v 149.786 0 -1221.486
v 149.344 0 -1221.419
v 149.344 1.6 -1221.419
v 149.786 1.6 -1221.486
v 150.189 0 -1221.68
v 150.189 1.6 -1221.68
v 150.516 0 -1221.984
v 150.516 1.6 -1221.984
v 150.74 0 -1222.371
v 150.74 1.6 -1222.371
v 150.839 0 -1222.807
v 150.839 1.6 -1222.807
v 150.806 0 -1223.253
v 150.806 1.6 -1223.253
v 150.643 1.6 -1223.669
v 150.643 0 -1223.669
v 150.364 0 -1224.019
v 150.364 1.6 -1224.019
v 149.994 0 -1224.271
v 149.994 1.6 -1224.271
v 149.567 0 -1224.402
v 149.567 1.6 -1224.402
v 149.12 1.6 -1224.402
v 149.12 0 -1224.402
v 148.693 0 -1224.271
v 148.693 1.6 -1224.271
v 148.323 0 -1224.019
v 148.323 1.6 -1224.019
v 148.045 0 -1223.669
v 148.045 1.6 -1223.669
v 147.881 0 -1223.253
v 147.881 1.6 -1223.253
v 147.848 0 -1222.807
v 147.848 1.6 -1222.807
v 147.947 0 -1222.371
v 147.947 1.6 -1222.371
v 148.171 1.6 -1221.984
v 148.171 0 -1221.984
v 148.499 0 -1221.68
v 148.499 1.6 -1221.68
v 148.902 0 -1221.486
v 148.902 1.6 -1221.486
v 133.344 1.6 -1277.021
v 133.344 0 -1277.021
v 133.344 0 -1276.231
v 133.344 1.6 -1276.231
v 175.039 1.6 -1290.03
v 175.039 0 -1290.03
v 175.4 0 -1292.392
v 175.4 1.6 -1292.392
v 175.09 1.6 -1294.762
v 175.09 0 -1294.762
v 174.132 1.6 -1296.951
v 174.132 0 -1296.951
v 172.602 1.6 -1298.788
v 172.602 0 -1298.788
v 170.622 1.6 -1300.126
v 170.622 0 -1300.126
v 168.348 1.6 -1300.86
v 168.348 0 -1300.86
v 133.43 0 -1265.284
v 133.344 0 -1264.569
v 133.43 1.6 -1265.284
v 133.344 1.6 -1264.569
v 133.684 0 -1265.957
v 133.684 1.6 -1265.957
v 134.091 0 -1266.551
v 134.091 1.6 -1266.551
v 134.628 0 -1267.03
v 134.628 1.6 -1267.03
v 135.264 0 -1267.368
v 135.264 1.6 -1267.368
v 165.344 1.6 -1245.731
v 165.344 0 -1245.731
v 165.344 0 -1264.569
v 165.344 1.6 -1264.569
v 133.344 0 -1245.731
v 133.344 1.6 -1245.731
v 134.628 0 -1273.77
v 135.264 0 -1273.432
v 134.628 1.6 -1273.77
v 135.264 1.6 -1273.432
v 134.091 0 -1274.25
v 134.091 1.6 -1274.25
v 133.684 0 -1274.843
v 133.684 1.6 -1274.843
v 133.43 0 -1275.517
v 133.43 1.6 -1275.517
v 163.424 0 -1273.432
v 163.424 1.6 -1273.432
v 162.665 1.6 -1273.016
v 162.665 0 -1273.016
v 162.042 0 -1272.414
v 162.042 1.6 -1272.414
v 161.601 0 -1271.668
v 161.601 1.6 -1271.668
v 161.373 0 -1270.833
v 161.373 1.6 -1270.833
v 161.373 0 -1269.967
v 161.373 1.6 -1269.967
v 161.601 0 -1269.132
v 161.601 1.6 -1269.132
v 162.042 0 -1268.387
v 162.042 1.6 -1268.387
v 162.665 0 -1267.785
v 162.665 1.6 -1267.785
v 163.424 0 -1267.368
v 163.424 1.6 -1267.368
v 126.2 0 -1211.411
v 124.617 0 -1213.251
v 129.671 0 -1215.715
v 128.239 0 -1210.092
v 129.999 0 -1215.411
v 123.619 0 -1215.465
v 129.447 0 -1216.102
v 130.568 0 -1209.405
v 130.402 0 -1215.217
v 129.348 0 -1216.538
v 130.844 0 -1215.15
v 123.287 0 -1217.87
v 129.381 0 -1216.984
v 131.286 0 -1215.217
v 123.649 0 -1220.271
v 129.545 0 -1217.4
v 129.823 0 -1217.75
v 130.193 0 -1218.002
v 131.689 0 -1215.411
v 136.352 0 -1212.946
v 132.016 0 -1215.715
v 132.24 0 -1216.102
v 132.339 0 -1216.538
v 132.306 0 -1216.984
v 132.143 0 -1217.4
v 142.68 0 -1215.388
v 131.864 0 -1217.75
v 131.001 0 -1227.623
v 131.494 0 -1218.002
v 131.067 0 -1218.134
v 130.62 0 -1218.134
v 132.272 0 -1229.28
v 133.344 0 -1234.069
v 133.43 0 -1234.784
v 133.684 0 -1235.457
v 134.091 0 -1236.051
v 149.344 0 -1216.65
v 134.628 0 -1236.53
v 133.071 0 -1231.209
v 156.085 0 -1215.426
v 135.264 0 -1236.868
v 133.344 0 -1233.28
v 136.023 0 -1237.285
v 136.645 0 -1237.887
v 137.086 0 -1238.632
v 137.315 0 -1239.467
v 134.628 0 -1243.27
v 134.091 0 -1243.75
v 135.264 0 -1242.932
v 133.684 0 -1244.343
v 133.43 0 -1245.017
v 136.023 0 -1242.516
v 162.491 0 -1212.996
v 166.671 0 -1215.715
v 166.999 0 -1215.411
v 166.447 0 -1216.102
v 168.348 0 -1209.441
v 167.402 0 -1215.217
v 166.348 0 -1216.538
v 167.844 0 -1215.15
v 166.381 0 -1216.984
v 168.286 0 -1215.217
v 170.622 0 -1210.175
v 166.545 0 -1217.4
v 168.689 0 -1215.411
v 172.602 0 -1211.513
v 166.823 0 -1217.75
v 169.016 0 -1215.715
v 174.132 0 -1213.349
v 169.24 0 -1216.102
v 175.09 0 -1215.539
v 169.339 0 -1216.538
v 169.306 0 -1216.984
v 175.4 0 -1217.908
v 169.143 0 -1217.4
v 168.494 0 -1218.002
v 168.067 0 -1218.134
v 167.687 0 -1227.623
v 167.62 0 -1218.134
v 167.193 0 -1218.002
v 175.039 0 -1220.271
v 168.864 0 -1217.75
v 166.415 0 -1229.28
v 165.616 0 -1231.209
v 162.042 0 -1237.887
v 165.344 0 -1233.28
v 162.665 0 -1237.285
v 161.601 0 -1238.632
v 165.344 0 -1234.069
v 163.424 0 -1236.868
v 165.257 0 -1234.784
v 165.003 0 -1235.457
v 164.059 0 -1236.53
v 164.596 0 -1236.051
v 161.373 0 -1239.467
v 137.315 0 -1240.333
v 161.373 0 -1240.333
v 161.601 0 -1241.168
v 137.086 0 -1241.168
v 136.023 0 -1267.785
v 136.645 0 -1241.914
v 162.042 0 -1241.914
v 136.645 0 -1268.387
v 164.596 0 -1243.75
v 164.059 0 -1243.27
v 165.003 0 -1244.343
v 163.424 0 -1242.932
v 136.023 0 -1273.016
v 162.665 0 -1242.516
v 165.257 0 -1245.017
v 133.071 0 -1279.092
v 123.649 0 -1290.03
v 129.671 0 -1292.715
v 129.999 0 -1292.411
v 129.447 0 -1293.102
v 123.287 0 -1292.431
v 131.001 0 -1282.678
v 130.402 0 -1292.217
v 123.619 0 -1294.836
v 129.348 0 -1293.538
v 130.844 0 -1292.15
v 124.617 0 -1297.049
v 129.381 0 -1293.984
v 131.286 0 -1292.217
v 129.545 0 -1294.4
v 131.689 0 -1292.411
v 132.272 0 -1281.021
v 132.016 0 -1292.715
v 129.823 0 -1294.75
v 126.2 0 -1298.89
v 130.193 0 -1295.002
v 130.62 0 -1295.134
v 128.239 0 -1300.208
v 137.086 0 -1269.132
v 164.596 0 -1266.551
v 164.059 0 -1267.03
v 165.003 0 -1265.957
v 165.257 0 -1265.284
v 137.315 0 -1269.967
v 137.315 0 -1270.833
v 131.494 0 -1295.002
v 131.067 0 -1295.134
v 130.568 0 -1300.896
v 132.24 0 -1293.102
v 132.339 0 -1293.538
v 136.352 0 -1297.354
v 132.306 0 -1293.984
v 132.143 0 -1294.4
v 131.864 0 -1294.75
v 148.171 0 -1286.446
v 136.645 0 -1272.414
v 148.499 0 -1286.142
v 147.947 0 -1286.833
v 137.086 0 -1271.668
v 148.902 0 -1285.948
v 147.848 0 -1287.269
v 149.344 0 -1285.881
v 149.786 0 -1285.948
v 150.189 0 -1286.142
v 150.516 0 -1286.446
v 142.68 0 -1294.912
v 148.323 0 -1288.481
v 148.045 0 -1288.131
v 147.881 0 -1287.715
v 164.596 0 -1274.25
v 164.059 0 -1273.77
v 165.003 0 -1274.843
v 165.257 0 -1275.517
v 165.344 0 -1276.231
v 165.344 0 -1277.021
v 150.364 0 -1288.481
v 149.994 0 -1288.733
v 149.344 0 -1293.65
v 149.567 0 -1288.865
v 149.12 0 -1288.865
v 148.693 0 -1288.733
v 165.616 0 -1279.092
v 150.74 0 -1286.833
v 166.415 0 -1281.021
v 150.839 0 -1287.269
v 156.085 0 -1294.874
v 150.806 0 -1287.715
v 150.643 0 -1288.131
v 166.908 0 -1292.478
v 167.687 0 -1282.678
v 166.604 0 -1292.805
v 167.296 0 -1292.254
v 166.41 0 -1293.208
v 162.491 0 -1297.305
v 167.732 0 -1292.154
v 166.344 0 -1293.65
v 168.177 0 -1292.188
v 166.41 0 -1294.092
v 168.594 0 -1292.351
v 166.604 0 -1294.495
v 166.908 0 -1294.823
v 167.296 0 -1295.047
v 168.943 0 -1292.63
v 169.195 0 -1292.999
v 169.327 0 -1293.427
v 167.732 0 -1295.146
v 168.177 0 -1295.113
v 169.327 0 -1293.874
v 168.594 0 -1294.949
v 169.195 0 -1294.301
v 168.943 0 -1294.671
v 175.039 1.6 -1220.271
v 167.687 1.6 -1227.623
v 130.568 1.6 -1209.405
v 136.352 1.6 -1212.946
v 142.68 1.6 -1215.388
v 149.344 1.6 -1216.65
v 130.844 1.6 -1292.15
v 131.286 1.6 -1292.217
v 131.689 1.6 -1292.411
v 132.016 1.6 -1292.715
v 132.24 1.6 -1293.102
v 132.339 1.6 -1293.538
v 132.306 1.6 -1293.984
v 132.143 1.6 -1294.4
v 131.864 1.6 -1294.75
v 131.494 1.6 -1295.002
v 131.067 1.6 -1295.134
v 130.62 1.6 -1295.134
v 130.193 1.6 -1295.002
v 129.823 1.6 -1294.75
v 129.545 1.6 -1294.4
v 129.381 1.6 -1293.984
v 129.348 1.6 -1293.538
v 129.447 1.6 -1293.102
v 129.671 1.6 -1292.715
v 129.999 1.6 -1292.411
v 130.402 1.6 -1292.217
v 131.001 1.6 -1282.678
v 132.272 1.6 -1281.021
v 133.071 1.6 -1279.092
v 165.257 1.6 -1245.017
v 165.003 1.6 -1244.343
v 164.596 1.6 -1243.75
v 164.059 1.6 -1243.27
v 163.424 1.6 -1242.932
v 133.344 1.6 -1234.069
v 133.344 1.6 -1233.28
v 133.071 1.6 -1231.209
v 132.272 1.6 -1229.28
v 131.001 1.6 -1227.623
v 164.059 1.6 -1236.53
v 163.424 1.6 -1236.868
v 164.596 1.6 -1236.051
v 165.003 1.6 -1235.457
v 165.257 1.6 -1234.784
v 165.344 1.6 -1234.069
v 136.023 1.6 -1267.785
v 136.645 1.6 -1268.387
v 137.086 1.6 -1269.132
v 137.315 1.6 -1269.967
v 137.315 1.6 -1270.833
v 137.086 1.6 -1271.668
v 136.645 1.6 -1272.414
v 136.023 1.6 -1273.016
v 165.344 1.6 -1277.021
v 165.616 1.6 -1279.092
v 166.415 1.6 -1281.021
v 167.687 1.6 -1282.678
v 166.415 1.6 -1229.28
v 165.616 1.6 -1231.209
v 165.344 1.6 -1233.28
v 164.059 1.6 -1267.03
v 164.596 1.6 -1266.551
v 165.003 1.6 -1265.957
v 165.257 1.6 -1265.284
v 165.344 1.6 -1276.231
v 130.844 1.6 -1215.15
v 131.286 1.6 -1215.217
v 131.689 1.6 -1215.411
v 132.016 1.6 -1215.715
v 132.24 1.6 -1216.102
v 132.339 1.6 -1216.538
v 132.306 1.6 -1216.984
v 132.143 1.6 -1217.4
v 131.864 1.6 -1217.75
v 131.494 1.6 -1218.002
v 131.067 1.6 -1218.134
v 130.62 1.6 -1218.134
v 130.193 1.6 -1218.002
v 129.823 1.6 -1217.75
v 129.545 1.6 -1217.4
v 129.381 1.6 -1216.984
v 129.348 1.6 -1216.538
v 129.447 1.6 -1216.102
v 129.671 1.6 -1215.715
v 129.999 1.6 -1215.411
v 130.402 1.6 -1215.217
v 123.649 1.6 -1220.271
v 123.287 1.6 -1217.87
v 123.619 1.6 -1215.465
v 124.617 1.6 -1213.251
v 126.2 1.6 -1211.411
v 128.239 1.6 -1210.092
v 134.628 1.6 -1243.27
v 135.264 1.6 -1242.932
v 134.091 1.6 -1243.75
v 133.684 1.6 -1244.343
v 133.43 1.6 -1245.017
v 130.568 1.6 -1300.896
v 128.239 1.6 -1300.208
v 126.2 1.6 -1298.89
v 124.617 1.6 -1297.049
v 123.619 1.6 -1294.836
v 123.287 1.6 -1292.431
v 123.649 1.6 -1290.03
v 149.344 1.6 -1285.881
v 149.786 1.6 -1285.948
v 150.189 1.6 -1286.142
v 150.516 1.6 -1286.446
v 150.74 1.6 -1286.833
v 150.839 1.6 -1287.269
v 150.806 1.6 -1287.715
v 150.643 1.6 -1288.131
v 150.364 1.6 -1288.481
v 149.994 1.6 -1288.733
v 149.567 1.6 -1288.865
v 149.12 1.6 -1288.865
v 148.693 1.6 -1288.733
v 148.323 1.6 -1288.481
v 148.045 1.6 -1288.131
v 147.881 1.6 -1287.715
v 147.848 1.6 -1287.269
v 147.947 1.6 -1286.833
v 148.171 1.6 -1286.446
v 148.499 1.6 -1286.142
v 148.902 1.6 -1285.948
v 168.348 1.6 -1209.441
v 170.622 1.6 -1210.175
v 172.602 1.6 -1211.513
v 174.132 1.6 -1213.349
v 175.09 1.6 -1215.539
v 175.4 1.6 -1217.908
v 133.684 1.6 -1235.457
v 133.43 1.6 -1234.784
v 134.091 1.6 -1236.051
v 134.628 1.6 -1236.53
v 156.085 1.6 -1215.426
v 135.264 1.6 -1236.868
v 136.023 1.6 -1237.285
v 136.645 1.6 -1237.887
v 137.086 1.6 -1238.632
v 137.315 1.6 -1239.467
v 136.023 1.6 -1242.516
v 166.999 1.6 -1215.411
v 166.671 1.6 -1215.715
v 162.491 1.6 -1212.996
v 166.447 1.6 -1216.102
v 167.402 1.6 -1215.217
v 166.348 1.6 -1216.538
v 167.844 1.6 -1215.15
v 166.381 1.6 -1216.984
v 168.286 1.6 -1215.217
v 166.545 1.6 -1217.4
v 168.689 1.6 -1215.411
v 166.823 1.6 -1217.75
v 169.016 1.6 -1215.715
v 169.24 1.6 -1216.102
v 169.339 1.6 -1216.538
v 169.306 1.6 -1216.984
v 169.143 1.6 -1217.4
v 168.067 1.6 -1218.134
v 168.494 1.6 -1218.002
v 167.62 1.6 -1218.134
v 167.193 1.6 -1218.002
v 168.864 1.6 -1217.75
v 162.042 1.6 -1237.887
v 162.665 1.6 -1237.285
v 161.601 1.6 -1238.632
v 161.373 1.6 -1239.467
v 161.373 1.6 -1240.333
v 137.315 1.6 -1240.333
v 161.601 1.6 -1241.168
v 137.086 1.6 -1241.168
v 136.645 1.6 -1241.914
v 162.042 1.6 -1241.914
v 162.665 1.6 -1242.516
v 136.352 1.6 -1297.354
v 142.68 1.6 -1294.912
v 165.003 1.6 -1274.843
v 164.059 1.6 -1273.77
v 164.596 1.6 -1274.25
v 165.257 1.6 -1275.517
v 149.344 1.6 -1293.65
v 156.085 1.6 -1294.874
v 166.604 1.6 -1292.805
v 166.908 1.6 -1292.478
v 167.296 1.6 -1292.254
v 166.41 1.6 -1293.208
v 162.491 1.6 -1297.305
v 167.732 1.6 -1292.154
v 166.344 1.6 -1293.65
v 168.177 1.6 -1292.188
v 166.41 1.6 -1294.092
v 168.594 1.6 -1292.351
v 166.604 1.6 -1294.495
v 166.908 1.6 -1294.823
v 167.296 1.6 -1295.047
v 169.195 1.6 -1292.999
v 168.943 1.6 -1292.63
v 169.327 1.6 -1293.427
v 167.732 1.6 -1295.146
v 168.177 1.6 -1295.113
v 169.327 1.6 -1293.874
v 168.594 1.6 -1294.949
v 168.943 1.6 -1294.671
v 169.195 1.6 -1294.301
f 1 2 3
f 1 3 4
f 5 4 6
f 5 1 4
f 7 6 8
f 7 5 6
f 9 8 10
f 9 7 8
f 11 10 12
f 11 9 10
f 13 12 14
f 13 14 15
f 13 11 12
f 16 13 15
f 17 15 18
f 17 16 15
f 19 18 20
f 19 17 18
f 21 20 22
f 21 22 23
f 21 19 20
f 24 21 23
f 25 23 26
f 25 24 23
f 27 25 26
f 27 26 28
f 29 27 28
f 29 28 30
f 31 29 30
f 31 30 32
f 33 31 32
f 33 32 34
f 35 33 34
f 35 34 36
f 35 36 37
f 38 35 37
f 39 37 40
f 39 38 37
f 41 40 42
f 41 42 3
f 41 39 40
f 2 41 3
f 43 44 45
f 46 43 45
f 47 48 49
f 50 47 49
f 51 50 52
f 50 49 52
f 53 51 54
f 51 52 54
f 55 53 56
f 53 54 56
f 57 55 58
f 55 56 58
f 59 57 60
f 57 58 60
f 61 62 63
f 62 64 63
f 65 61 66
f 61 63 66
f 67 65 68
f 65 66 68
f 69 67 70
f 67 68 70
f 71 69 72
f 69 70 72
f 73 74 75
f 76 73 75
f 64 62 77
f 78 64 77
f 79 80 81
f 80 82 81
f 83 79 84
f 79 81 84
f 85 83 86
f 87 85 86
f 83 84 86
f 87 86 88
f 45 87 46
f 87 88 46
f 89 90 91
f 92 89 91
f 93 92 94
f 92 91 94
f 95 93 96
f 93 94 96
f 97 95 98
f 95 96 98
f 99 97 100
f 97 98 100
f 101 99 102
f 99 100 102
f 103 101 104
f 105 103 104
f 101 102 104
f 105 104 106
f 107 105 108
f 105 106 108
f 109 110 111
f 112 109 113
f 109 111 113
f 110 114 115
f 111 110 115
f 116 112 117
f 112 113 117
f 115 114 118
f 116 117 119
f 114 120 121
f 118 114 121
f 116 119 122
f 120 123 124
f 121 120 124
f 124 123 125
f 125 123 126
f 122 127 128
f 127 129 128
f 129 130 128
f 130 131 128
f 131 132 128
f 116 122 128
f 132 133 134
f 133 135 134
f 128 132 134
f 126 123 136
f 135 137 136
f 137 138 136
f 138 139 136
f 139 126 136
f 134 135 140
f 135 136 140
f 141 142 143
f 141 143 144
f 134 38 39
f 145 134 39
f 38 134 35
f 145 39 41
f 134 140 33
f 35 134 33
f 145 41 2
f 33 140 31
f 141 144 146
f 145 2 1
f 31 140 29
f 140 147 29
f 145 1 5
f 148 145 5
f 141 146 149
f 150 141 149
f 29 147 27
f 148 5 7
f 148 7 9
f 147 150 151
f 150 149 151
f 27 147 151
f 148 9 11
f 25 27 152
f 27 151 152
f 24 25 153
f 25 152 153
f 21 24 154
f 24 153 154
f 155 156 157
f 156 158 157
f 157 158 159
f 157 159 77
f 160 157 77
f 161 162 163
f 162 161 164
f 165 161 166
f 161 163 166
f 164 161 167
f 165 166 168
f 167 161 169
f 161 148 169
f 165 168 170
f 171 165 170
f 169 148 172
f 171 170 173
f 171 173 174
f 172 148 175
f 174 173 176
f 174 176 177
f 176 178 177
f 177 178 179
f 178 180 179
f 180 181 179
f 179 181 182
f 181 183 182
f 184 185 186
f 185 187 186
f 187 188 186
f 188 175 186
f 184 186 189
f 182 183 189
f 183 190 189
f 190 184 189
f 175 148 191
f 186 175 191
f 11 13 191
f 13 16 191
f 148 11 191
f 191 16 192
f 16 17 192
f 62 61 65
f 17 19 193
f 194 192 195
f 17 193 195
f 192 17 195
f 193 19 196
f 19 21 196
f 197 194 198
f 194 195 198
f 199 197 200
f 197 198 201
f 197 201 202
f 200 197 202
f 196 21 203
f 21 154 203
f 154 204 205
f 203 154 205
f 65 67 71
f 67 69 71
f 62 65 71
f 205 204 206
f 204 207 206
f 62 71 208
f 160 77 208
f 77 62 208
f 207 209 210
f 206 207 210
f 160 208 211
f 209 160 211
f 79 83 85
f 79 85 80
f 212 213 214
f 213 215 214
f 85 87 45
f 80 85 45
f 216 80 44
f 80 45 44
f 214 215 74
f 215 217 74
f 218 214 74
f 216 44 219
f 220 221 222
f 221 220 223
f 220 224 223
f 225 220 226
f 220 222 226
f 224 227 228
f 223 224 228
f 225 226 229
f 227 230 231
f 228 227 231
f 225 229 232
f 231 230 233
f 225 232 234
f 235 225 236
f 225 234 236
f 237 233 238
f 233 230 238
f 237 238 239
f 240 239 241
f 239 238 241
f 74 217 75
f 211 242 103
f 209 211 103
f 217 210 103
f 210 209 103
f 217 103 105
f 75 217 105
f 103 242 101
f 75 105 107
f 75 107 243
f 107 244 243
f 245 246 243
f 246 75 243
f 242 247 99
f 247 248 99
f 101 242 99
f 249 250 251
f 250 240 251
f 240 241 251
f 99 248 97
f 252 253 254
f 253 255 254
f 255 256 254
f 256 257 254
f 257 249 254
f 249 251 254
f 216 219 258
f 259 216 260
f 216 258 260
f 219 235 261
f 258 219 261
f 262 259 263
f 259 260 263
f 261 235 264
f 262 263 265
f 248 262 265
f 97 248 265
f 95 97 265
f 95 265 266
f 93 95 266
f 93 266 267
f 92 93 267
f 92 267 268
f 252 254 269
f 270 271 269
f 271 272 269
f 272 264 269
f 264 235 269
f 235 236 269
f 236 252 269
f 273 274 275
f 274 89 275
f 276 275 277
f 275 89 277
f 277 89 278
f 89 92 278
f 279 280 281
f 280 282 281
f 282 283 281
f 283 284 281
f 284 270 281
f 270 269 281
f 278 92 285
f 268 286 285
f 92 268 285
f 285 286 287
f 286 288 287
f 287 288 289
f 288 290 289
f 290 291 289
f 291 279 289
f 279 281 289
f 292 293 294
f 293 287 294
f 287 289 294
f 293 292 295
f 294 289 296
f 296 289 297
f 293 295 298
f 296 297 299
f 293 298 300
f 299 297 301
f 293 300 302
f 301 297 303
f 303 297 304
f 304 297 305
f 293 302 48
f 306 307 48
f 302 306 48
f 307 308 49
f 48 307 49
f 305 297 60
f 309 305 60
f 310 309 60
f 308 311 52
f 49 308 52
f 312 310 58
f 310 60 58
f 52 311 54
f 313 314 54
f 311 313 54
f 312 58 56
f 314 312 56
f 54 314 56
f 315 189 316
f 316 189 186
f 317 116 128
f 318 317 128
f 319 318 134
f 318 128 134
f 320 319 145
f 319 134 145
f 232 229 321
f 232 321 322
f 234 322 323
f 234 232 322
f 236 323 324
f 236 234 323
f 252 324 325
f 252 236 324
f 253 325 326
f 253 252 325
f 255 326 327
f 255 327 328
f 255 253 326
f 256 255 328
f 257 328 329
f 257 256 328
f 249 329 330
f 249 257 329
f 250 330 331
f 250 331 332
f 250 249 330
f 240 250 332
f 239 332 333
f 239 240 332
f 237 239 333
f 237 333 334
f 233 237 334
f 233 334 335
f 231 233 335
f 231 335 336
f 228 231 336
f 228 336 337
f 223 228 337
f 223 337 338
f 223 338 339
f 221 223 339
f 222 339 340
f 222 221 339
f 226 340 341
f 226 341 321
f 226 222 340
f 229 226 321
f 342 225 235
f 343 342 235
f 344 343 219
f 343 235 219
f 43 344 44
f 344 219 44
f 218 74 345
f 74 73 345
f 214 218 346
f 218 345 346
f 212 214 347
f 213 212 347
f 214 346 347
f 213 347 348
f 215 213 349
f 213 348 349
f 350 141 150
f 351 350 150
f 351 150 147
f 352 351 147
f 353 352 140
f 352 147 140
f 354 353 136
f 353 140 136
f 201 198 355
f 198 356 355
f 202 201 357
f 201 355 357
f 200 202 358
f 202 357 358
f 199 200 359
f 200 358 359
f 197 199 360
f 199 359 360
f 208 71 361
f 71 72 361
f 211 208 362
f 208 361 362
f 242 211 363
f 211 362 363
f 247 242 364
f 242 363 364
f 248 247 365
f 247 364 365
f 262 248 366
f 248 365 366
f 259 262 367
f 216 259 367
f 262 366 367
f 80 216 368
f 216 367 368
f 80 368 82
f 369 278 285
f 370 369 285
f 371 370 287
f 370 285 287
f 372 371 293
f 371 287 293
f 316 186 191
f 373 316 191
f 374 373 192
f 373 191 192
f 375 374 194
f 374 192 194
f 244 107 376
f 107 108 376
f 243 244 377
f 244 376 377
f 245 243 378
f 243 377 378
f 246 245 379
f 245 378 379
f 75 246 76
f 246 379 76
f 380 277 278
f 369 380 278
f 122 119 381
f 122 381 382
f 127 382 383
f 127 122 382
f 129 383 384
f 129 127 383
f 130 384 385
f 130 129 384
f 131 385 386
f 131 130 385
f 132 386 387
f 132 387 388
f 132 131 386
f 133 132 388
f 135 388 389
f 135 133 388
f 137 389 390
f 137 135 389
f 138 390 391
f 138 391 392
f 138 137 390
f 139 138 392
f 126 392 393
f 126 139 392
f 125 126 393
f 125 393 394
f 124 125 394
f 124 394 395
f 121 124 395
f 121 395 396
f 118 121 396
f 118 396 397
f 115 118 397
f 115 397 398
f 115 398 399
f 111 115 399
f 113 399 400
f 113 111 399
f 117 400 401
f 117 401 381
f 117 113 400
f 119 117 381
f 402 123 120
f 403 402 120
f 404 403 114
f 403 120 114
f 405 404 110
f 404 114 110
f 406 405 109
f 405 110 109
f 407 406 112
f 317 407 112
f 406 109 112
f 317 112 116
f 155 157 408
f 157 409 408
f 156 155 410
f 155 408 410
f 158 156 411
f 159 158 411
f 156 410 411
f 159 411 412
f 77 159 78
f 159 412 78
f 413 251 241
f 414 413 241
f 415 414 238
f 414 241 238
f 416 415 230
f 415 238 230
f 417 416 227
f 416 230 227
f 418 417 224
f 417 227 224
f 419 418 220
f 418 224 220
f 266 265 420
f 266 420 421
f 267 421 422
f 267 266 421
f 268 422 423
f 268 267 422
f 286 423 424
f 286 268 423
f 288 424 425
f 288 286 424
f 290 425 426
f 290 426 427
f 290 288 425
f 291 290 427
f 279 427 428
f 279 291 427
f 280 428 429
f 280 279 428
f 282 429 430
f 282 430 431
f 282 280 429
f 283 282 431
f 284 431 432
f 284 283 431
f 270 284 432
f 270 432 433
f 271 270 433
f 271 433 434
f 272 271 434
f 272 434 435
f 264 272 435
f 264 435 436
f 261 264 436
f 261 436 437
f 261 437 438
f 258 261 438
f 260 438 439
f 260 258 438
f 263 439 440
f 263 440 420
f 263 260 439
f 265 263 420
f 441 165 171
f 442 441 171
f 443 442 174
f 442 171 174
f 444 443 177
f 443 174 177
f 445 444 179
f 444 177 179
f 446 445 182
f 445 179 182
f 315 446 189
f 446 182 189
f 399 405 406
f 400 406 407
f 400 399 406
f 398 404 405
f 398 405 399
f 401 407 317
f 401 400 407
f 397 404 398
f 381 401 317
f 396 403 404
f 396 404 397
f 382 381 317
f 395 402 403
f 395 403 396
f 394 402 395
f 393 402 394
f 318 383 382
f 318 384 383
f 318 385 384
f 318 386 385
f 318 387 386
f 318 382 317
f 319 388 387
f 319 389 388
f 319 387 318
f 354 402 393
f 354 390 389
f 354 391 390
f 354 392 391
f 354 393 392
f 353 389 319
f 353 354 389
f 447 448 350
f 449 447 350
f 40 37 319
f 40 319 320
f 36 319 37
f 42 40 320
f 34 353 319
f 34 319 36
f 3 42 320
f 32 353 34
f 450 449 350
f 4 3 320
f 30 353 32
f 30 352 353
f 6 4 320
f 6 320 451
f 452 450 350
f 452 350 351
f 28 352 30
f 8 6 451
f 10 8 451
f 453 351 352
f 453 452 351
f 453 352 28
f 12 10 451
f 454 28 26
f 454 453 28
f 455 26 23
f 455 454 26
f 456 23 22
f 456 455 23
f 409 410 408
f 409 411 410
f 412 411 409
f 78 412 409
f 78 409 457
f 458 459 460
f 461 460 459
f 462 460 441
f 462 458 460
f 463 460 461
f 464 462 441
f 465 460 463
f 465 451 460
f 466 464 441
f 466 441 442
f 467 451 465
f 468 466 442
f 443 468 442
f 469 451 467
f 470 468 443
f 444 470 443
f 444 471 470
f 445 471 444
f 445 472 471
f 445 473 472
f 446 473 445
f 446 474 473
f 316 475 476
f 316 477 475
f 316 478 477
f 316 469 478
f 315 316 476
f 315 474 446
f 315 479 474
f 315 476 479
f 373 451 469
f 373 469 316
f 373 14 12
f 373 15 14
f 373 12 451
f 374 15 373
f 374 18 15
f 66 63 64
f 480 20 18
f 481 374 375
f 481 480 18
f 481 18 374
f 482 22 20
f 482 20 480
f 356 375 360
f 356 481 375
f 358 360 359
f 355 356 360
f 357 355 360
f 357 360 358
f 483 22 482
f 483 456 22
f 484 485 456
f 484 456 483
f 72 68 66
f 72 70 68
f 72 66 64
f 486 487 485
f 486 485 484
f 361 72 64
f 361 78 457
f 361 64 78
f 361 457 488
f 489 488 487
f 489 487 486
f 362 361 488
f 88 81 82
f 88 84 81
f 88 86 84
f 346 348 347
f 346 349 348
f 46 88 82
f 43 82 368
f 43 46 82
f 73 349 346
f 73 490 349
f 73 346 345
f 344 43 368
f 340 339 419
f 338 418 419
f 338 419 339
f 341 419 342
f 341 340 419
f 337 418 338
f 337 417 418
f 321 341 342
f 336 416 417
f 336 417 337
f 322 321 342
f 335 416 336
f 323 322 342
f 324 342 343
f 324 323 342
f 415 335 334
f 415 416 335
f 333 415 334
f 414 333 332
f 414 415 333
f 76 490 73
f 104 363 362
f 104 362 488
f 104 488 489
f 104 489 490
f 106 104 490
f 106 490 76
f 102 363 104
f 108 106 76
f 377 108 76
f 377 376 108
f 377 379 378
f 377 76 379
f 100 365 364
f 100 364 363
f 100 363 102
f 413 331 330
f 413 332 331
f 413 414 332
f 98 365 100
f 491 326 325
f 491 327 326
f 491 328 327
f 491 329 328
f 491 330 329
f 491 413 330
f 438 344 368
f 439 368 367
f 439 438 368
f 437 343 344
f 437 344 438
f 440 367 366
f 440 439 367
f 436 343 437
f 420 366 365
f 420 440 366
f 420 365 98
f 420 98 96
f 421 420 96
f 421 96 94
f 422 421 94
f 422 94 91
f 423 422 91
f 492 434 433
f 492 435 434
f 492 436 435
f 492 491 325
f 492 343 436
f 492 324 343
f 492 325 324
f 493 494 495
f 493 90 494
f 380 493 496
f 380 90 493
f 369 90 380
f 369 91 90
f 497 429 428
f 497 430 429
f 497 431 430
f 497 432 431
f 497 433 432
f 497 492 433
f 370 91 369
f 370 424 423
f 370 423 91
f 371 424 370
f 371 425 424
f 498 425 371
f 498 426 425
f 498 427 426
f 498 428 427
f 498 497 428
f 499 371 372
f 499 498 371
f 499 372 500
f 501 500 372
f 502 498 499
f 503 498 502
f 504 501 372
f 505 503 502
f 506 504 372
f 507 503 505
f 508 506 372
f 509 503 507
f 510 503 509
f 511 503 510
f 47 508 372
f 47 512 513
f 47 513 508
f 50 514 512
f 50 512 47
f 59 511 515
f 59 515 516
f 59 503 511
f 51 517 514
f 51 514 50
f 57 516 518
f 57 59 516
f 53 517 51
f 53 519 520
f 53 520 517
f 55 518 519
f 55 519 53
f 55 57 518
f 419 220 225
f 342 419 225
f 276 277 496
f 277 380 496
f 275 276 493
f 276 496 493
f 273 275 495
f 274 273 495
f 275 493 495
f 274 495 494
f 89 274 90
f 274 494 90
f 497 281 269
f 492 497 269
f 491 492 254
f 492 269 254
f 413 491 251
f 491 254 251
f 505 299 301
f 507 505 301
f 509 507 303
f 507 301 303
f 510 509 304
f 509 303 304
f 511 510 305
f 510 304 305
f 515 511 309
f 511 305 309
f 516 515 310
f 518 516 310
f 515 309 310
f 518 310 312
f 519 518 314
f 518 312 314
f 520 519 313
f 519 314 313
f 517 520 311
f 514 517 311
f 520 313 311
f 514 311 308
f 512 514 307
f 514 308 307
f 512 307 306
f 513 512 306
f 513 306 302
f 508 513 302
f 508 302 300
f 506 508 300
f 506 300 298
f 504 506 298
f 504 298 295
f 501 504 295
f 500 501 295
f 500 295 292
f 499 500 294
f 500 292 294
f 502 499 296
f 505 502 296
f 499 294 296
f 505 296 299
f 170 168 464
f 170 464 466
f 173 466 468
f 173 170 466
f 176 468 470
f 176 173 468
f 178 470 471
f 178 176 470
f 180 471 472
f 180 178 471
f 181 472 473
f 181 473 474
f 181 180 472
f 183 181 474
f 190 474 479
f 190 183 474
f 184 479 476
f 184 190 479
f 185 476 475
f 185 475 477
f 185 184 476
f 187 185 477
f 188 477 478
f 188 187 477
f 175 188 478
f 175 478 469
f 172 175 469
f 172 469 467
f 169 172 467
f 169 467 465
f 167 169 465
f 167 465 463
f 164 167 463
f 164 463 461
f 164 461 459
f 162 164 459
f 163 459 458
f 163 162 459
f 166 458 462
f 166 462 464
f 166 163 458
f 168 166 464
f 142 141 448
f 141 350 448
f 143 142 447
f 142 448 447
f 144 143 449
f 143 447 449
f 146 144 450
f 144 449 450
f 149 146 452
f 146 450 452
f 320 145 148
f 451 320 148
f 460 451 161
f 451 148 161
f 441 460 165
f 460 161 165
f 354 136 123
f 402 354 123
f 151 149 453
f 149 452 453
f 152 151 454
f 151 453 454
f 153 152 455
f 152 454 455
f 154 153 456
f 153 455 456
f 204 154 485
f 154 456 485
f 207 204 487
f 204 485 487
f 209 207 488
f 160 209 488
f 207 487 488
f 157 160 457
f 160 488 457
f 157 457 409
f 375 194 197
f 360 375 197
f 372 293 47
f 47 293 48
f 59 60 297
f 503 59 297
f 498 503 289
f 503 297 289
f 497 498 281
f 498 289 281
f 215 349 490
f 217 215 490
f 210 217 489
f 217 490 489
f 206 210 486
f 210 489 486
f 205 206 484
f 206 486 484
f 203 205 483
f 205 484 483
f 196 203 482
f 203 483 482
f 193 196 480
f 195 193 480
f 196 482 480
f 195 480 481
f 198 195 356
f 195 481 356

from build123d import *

# Parameters (mm, degrees)
SKETCH1_R           = 1.5
BOSS_EXTRUDE1_DEPTH = 1.6
SKETCH2_R           = 3.25
CUT_EXTRUDE1_DEPTH  = 1.6
FILLET1_R           = 3


with BuildPart() as part:
    # Sketch1 → Boss-Extrude1 (new body)
    with BuildSketch(Plane(origin=(0, 0, 0), x_dir=(1, 0, 0), z_dir=(0, 1, 0))):
        with BuildLine():
            ThreePointArc((168.347792712, 1300.859692621), (159.343486253, 1295.942873675), (149.343647654, 1293.65030495))
            ThreePointArc((149.343647654, 1293.65030495), (139.460555114, 1295.990018463), (130.567766275, 1300.895941835))
            ThreePointArc((130.567766275, 1300.895941835), (124.616810573, 1297.0492589), (123.648598599, 1290.029756856))
            Line((123.648598599, 1290.029756856), (131.000501903, 1282.677853551))
            ThreePointArc((131.000501903, 1282.677853551), (132.734683914, 1280.082466761), (133.343647654, 1277.020999302))
            Line((133.343647654, 1277.020999302), (133.343647654, 1272.65030495))
            Line((133.343647654, 1272.65030495), (133.343647654, 1269.65030495))
            Line((133.343647654, 1269.65030495), (133.343647654, 1240.65030495))
            Line((133.343647654, 1240.65030495), (133.343647654, 1237.65030495))
            Line((133.343647654, 1237.65030495), (133.343647654, 1233.279610599))
            ThreePointArc((133.343647654, 1233.279610599), (132.734683914, 1230.21814314), (131.000501903, 1227.622756349))
            Line((131.000501903, 1227.622756349), (123.648598599, 1220.270853045))
            ThreePointArc((123.648598599, 1220.270853045), (124.616810573, 1213.251351001), (130.567766275, 1209.404668065))
            ThreePointArc((130.567766275, 1209.404668065), (139.460555114, 1214.310591438), (149.343647654, 1216.65030495))
            ThreePointArc((149.343647654, 1216.65030495), (159.343486253, 1214.357736226), (168.347792712, 1209.44091728))
            ThreePointArc((168.347792712, 1209.44091728), (174.131892083, 1213.349250607), (175.038696709, 1220.270853045))
            Line((175.038696709, 1220.270853045), (167.686793404, 1227.622756349))
            ThreePointArc((167.686793404, 1227.622756349), (165.952611394, 1230.21814314), (165.343647654, 1233.279610599))
            Line((165.343647654, 1233.279610599), (165.343647654, 1237.65030495))
            Line((165.343647654, 1237.65030495), (165.343647654, 1240.65030495))
            Line((165.343647654, 1240.65030495), (165.343647654, 1269.65030495))
            Line((165.343647654, 1269.65030495), (165.343647654, 1272.65030495))
            Line((165.343647654, 1272.65030495), (165.343647654, 1277.020999302))
            ThreePointArc((165.343647654, 1277.020999302), (165.952611394, 1280.082466761), (167.686793404, 1282.677853551))
            Line((167.686793404, 1282.677853551), (175.038696709, 1290.029756856))
            ThreePointArc((175.038696709, 1290.029756856), (174.131892083, 1296.951359294), (168.347792712, 1300.859692621))
        make_face()
        with Locations(Location((130.843647654, 1216.65030495, 0), (0, 0, 270))):
            Circle(SKETCH1_R, mode=Mode.SUBTRACT)
        with Locations(Location((149.343647654, 1222.919184261, 0), (0, 0, 270))):
            Circle(SKETCH1_R, mode=Mode.SUBTRACT)
        with Locations(Location((167.843647654, 1216.65030495, 0), (0, 0, 270))):
            Circle(SKETCH1_R, mode=Mode.SUBTRACT)
        with Locations(Location((130.843647654, 1293.65030495, 0), (0, 0, 270))):
            Circle(SKETCH1_R, mode=Mode.SUBTRACT)
        with Locations(Location((149.343647654, 1287.38142564, 0), (0, 0, 270))):
            Circle(SKETCH1_R, mode=Mode.SUBTRACT)
        with BuildLine():
            ThreePointArc((169.343647654, 1293.65030495), (167.843647654, 1292.15030495), (166.343647654, 1293.65030495))
            ThreePointArc((166.343647654, 1293.65030495), (167.843647654, 1295.15030495), (169.343647654, 1293.65030495))
        make_face(mode=Mode.SUBTRACT)
    extrude(amount=BOSS_EXTRUDE1_DEPTH)

    # Sketch2 → Cut-Extrude1 (cut)
    with BuildSketch(Plane(origin=(0, 1.6, 0), x_dir=(1, 0, 0), z_dir=(0, 1, 0))):
        with Locations((134.093647654, 1239.90030495)):
            Circle(SKETCH2_R)
        with Locations((164.593647654, 1239.90030495)):
            Circle(SKETCH2_R)
        with Locations((164.593647654, 1270.40030495)):
            Circle(SKETCH2_R)
        with Locations((134.093647654, 1270.40030495)):
            Circle(SKETCH2_R)
    extrude(amount=-CUT_EXTRUDE1_DEPTH, mode=Mode.SUBTRACT)

    # Fillet1
    fillet1_edges = [part.edges().sort_by_distance(p)[0] for p in [
        (133.343647654, 0.8, -1243.062582611),
        (133.343647654, 0.8, -1236.73802729),
        (133.343647654, 0.8, -1273.562582611),
        (133.343647654, 0.8, -1267.23802729),
        (165.343647654, 0.8, -1267.23802729),
        (165.343647654, 0.8, -1273.562582611),
        (165.343647654, 0.8, -1236.73802729),
        (165.343647654, 0.8, -1243.062582611),
    ]]
    fillet(fillet1_edges, radius=FILLET1_R)


solid = part.part
